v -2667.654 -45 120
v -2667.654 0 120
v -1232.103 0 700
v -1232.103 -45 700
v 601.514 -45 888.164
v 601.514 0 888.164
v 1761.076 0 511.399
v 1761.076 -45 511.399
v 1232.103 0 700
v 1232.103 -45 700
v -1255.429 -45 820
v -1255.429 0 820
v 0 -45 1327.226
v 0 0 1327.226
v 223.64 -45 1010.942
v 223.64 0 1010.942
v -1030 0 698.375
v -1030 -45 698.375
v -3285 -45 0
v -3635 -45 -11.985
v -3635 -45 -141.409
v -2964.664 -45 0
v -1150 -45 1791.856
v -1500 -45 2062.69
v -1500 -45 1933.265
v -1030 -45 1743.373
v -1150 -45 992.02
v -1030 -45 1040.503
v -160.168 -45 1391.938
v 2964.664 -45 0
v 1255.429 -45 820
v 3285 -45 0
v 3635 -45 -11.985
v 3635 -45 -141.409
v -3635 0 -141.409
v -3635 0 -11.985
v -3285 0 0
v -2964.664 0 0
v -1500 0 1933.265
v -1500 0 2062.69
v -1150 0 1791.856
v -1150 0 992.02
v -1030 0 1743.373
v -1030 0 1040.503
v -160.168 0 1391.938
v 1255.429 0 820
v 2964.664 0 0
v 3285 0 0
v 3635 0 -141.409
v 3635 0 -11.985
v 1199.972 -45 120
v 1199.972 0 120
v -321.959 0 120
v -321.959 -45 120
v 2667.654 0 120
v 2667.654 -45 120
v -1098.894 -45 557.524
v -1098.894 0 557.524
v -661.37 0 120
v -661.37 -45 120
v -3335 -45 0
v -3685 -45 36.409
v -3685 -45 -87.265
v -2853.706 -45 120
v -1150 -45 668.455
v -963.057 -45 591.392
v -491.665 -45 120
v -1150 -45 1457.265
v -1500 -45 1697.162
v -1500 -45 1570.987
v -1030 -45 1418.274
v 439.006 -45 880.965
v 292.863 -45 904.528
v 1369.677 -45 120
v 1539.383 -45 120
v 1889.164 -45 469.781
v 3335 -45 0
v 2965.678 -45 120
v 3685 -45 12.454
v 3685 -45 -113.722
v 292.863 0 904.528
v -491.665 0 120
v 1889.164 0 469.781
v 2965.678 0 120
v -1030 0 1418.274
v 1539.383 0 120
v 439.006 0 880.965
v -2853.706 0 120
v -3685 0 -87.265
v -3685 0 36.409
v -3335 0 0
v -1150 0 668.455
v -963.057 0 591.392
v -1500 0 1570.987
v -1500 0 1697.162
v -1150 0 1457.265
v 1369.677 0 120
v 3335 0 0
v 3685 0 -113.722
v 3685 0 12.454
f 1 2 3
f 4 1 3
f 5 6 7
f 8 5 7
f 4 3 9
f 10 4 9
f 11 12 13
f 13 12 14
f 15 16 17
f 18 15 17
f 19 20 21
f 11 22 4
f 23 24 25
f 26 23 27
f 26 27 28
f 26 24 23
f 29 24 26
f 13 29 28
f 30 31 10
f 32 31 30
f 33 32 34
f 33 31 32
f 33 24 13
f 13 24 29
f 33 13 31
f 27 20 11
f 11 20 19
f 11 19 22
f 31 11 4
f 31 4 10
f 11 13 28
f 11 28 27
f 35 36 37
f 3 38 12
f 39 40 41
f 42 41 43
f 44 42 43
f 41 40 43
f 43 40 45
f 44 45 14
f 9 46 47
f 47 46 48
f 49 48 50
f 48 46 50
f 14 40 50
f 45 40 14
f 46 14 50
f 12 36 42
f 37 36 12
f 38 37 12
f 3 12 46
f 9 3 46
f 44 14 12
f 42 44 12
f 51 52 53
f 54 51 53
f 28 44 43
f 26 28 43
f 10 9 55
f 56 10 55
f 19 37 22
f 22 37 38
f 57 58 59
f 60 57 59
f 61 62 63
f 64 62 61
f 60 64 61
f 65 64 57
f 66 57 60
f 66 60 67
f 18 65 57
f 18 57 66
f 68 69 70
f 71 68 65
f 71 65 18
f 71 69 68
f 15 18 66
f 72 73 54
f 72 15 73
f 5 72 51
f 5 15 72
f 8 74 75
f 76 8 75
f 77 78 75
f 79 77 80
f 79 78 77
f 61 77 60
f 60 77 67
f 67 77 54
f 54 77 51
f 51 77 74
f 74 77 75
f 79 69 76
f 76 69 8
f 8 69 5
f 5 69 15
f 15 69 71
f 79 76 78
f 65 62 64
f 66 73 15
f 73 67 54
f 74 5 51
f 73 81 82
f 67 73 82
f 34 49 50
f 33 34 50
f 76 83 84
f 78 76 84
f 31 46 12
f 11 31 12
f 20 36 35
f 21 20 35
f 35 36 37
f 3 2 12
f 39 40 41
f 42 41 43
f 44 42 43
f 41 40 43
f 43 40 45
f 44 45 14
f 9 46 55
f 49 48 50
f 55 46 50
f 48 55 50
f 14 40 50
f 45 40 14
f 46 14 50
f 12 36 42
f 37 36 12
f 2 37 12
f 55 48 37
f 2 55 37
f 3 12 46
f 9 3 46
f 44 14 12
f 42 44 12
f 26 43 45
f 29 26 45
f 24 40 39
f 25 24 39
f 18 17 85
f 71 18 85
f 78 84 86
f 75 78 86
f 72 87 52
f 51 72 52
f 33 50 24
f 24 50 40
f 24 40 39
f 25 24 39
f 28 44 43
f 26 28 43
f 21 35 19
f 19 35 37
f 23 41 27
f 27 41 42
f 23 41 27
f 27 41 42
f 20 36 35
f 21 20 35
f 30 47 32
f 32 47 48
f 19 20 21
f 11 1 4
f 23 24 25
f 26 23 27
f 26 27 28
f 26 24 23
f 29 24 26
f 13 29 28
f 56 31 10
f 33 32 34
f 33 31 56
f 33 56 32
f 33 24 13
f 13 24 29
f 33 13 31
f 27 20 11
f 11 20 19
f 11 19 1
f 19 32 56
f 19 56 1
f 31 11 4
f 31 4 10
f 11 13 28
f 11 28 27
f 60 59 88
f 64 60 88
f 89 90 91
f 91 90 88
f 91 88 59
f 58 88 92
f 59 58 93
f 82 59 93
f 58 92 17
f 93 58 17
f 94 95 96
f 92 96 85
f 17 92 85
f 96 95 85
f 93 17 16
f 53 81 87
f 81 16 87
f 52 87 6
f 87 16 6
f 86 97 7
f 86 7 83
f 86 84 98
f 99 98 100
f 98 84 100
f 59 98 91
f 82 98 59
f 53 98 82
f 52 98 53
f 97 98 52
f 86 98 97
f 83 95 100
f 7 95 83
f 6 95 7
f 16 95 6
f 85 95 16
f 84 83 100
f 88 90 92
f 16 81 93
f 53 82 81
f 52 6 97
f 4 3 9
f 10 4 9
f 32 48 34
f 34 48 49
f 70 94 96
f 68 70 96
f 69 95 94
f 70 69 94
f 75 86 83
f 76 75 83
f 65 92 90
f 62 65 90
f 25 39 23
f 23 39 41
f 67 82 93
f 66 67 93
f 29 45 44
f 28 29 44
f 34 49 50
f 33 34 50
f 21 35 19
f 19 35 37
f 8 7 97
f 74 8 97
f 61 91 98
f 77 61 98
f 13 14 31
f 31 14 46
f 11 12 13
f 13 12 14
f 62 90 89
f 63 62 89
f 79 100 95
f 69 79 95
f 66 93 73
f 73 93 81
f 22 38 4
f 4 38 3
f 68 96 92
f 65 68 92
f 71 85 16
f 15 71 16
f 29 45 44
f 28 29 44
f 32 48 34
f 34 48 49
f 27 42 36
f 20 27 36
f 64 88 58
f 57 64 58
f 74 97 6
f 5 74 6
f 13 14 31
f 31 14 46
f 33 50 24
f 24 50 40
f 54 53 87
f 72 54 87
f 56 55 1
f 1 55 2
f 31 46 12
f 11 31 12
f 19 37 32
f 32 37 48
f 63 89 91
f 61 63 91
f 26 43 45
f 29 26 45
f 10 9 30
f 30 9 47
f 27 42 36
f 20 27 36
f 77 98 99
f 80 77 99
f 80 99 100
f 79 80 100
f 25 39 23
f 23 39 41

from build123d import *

# Parameters (mm, degrees)
F1_DEPTH = 45
F4_DEPTH = 45
F5_DEPTH = 45


with BuildPart() as f1:
    # F0 (on Front) → F1 (new body)
    with BuildSketch(Plane.XZ):
        Polygon((-3685, -87.264801), (-3335, 0), (-2853.706288, 120), (-1098.894264, 557.523777), (-963.056736, 591.391877), (292.862969, 904.527829), (439.006195, 940.965427), (223.639837, 1010.942199), (-1030, 698.374682), (-1150, 668.455322), (-3685, 36.408835), align=None)
        Polygon((-1150, 1457.264838), (-1150, 668.455322), (-1030, 698.374682), (-1030, 1418.274474), align=None)
        Polygon((2965.677976, 120), (3335, 0), (3685, -113.721894), (3685, 12.453573), (-1500, 1697.162198), (-1500, 1570.986731), (-1150, 1457.264838), (-1030, 1418.274474), (223.639837, 1010.942199), (439.006195, 940.965427), (601.513717, 888.163533), (1761.076119, 511.398869), (1889.163601, 469.780724), align=None)
        Polygon((1199.971623, 120), (1369.67725, 120), (601.513717, 888.163533), (439.006195, 940.965427), (439.006195, 880.965427), align=None)
        Polygon((1369.67725, 120), (1539.382877, 120), (1889.163601, 469.780724), (1761.076119, 511.398869), align=None)
        Polygon((-2853.706288, 120), (-3335, 0), (3335, 0), (2965.677976, 120), (1539.382877, 120), (1369.67725, 120), (1199.971623, 120), (-321.959232, 120), (-491.66486, 120), (-661.370487, 120), align=None)
        Polygon((292.862969, 904.527829), (-491.66486, 120), (-321.959232, 120), (439.006195, 880.965427), (439.006195, 940.965427), align=None)
        Polygon((-1098.894264, 557.523777), (-661.370487, 120), (-491.66486, 120), (-963.056736, 591.391877), align=None)
    extrude(amount=F1_DEPTH)


with BuildPart() as f4:
    # F2 (on Front) → F4 (new body)
    with BuildSketch(Plane.XZ):
        Polygon((-1552.439203, 700), (-3285, 0), (-2964.66394, 0), (-1232.103143, 700), align=None)
        Polygon((-3635, -141.409179), (-3285, 0), (-1552.439203, 700), (-1255.42878, 820), (0, 1327.226152), (-160.16803, 1391.938236), (-1030, 1040.503308), (-1150, 992.020161), (-3635, -11.98501), align=None)
        Polygon((-1255.42878, 820), (-1552.439203, 700), (-1232.103143, 700), (1232.103143, 700), (1552.439203, 700), (1255.42878, 820), align=None)
        Polygon((1552.439203, 700), (1232.103143, 700), (2964.66394, 0), (3285, 0), align=None)
        Polygon((-160.16803, 1391.938236), (0, 1327.226152), (1255.42878, 820), (1552.439203, 700), (3285, 0), (3635, -141.409179), (3635, -11.98501), (-1500, 2062.68966), (-1500, 1933.265491), (-1150, 1791.856312), (-1030, 1743.373164), align=None)
        Polygon((-1150, 1791.856312), (-1150, 992.020161), (-1030, 1040.503308), (-1030, 1743.373164), align=None)
    extrude(amount=F4_DEPTH)


with BuildPart() as f5:
    # F3 (on Front) → F5 (new body)
    with BuildSketch(Plane.XZ):
        Polygon((3285, 0), (3635, -141.409179), (3635, -11.98501), (-1500, 2062.68966), (-1500, 1933.265491), (-1150, 1791.856312), (-1030, 1743.373164), (-160.16803, 1391.938236), (0, 1327.226152), (1255.42878, 820), (1552.439203, 700), (2987.989578, 120), align=None)
        Polygon((-3285, 0), (3285, 0), (2987.989578, 120), (2667.653518, 120), (-2667.653518, 120), (-2987.989578, 120), align=None)
        Polygon((-3635, -141.409179), (-3285, 0), (-2987.989578, 120), (-1552.439203, 700), (-1255.42878, 820), (0, 1327.226152), (-160.16803, 1391.938236), (-1030, 1040.503308), (-1150, 992.020161), (-3635, -11.98501), align=None)
        Polygon((-1030, 1743.373164), (-1150, 1791.856312), (-1150, 992.020161), (-1030, 1040.503308), align=None)
        Polygon((-1552.439203, 700), (-2987.989578, 120), (-2667.653518, 120), (-1232.103143, 700), align=None)
        Polygon((1232.103143, 700), (1552.439203, 700), (1255.42878, 820), (-1255.42878, 820), (-1552.439203, 700), (-1232.103143, 700), align=None)
        Polygon((2667.653518, 120), (2987.989578, 120), (1552.439203, 700), (1232.103143, 700), align=None)
    extrude(amount=F5_DEPTH)


solid = Compound([f1.part, f4.part, f5.part])
